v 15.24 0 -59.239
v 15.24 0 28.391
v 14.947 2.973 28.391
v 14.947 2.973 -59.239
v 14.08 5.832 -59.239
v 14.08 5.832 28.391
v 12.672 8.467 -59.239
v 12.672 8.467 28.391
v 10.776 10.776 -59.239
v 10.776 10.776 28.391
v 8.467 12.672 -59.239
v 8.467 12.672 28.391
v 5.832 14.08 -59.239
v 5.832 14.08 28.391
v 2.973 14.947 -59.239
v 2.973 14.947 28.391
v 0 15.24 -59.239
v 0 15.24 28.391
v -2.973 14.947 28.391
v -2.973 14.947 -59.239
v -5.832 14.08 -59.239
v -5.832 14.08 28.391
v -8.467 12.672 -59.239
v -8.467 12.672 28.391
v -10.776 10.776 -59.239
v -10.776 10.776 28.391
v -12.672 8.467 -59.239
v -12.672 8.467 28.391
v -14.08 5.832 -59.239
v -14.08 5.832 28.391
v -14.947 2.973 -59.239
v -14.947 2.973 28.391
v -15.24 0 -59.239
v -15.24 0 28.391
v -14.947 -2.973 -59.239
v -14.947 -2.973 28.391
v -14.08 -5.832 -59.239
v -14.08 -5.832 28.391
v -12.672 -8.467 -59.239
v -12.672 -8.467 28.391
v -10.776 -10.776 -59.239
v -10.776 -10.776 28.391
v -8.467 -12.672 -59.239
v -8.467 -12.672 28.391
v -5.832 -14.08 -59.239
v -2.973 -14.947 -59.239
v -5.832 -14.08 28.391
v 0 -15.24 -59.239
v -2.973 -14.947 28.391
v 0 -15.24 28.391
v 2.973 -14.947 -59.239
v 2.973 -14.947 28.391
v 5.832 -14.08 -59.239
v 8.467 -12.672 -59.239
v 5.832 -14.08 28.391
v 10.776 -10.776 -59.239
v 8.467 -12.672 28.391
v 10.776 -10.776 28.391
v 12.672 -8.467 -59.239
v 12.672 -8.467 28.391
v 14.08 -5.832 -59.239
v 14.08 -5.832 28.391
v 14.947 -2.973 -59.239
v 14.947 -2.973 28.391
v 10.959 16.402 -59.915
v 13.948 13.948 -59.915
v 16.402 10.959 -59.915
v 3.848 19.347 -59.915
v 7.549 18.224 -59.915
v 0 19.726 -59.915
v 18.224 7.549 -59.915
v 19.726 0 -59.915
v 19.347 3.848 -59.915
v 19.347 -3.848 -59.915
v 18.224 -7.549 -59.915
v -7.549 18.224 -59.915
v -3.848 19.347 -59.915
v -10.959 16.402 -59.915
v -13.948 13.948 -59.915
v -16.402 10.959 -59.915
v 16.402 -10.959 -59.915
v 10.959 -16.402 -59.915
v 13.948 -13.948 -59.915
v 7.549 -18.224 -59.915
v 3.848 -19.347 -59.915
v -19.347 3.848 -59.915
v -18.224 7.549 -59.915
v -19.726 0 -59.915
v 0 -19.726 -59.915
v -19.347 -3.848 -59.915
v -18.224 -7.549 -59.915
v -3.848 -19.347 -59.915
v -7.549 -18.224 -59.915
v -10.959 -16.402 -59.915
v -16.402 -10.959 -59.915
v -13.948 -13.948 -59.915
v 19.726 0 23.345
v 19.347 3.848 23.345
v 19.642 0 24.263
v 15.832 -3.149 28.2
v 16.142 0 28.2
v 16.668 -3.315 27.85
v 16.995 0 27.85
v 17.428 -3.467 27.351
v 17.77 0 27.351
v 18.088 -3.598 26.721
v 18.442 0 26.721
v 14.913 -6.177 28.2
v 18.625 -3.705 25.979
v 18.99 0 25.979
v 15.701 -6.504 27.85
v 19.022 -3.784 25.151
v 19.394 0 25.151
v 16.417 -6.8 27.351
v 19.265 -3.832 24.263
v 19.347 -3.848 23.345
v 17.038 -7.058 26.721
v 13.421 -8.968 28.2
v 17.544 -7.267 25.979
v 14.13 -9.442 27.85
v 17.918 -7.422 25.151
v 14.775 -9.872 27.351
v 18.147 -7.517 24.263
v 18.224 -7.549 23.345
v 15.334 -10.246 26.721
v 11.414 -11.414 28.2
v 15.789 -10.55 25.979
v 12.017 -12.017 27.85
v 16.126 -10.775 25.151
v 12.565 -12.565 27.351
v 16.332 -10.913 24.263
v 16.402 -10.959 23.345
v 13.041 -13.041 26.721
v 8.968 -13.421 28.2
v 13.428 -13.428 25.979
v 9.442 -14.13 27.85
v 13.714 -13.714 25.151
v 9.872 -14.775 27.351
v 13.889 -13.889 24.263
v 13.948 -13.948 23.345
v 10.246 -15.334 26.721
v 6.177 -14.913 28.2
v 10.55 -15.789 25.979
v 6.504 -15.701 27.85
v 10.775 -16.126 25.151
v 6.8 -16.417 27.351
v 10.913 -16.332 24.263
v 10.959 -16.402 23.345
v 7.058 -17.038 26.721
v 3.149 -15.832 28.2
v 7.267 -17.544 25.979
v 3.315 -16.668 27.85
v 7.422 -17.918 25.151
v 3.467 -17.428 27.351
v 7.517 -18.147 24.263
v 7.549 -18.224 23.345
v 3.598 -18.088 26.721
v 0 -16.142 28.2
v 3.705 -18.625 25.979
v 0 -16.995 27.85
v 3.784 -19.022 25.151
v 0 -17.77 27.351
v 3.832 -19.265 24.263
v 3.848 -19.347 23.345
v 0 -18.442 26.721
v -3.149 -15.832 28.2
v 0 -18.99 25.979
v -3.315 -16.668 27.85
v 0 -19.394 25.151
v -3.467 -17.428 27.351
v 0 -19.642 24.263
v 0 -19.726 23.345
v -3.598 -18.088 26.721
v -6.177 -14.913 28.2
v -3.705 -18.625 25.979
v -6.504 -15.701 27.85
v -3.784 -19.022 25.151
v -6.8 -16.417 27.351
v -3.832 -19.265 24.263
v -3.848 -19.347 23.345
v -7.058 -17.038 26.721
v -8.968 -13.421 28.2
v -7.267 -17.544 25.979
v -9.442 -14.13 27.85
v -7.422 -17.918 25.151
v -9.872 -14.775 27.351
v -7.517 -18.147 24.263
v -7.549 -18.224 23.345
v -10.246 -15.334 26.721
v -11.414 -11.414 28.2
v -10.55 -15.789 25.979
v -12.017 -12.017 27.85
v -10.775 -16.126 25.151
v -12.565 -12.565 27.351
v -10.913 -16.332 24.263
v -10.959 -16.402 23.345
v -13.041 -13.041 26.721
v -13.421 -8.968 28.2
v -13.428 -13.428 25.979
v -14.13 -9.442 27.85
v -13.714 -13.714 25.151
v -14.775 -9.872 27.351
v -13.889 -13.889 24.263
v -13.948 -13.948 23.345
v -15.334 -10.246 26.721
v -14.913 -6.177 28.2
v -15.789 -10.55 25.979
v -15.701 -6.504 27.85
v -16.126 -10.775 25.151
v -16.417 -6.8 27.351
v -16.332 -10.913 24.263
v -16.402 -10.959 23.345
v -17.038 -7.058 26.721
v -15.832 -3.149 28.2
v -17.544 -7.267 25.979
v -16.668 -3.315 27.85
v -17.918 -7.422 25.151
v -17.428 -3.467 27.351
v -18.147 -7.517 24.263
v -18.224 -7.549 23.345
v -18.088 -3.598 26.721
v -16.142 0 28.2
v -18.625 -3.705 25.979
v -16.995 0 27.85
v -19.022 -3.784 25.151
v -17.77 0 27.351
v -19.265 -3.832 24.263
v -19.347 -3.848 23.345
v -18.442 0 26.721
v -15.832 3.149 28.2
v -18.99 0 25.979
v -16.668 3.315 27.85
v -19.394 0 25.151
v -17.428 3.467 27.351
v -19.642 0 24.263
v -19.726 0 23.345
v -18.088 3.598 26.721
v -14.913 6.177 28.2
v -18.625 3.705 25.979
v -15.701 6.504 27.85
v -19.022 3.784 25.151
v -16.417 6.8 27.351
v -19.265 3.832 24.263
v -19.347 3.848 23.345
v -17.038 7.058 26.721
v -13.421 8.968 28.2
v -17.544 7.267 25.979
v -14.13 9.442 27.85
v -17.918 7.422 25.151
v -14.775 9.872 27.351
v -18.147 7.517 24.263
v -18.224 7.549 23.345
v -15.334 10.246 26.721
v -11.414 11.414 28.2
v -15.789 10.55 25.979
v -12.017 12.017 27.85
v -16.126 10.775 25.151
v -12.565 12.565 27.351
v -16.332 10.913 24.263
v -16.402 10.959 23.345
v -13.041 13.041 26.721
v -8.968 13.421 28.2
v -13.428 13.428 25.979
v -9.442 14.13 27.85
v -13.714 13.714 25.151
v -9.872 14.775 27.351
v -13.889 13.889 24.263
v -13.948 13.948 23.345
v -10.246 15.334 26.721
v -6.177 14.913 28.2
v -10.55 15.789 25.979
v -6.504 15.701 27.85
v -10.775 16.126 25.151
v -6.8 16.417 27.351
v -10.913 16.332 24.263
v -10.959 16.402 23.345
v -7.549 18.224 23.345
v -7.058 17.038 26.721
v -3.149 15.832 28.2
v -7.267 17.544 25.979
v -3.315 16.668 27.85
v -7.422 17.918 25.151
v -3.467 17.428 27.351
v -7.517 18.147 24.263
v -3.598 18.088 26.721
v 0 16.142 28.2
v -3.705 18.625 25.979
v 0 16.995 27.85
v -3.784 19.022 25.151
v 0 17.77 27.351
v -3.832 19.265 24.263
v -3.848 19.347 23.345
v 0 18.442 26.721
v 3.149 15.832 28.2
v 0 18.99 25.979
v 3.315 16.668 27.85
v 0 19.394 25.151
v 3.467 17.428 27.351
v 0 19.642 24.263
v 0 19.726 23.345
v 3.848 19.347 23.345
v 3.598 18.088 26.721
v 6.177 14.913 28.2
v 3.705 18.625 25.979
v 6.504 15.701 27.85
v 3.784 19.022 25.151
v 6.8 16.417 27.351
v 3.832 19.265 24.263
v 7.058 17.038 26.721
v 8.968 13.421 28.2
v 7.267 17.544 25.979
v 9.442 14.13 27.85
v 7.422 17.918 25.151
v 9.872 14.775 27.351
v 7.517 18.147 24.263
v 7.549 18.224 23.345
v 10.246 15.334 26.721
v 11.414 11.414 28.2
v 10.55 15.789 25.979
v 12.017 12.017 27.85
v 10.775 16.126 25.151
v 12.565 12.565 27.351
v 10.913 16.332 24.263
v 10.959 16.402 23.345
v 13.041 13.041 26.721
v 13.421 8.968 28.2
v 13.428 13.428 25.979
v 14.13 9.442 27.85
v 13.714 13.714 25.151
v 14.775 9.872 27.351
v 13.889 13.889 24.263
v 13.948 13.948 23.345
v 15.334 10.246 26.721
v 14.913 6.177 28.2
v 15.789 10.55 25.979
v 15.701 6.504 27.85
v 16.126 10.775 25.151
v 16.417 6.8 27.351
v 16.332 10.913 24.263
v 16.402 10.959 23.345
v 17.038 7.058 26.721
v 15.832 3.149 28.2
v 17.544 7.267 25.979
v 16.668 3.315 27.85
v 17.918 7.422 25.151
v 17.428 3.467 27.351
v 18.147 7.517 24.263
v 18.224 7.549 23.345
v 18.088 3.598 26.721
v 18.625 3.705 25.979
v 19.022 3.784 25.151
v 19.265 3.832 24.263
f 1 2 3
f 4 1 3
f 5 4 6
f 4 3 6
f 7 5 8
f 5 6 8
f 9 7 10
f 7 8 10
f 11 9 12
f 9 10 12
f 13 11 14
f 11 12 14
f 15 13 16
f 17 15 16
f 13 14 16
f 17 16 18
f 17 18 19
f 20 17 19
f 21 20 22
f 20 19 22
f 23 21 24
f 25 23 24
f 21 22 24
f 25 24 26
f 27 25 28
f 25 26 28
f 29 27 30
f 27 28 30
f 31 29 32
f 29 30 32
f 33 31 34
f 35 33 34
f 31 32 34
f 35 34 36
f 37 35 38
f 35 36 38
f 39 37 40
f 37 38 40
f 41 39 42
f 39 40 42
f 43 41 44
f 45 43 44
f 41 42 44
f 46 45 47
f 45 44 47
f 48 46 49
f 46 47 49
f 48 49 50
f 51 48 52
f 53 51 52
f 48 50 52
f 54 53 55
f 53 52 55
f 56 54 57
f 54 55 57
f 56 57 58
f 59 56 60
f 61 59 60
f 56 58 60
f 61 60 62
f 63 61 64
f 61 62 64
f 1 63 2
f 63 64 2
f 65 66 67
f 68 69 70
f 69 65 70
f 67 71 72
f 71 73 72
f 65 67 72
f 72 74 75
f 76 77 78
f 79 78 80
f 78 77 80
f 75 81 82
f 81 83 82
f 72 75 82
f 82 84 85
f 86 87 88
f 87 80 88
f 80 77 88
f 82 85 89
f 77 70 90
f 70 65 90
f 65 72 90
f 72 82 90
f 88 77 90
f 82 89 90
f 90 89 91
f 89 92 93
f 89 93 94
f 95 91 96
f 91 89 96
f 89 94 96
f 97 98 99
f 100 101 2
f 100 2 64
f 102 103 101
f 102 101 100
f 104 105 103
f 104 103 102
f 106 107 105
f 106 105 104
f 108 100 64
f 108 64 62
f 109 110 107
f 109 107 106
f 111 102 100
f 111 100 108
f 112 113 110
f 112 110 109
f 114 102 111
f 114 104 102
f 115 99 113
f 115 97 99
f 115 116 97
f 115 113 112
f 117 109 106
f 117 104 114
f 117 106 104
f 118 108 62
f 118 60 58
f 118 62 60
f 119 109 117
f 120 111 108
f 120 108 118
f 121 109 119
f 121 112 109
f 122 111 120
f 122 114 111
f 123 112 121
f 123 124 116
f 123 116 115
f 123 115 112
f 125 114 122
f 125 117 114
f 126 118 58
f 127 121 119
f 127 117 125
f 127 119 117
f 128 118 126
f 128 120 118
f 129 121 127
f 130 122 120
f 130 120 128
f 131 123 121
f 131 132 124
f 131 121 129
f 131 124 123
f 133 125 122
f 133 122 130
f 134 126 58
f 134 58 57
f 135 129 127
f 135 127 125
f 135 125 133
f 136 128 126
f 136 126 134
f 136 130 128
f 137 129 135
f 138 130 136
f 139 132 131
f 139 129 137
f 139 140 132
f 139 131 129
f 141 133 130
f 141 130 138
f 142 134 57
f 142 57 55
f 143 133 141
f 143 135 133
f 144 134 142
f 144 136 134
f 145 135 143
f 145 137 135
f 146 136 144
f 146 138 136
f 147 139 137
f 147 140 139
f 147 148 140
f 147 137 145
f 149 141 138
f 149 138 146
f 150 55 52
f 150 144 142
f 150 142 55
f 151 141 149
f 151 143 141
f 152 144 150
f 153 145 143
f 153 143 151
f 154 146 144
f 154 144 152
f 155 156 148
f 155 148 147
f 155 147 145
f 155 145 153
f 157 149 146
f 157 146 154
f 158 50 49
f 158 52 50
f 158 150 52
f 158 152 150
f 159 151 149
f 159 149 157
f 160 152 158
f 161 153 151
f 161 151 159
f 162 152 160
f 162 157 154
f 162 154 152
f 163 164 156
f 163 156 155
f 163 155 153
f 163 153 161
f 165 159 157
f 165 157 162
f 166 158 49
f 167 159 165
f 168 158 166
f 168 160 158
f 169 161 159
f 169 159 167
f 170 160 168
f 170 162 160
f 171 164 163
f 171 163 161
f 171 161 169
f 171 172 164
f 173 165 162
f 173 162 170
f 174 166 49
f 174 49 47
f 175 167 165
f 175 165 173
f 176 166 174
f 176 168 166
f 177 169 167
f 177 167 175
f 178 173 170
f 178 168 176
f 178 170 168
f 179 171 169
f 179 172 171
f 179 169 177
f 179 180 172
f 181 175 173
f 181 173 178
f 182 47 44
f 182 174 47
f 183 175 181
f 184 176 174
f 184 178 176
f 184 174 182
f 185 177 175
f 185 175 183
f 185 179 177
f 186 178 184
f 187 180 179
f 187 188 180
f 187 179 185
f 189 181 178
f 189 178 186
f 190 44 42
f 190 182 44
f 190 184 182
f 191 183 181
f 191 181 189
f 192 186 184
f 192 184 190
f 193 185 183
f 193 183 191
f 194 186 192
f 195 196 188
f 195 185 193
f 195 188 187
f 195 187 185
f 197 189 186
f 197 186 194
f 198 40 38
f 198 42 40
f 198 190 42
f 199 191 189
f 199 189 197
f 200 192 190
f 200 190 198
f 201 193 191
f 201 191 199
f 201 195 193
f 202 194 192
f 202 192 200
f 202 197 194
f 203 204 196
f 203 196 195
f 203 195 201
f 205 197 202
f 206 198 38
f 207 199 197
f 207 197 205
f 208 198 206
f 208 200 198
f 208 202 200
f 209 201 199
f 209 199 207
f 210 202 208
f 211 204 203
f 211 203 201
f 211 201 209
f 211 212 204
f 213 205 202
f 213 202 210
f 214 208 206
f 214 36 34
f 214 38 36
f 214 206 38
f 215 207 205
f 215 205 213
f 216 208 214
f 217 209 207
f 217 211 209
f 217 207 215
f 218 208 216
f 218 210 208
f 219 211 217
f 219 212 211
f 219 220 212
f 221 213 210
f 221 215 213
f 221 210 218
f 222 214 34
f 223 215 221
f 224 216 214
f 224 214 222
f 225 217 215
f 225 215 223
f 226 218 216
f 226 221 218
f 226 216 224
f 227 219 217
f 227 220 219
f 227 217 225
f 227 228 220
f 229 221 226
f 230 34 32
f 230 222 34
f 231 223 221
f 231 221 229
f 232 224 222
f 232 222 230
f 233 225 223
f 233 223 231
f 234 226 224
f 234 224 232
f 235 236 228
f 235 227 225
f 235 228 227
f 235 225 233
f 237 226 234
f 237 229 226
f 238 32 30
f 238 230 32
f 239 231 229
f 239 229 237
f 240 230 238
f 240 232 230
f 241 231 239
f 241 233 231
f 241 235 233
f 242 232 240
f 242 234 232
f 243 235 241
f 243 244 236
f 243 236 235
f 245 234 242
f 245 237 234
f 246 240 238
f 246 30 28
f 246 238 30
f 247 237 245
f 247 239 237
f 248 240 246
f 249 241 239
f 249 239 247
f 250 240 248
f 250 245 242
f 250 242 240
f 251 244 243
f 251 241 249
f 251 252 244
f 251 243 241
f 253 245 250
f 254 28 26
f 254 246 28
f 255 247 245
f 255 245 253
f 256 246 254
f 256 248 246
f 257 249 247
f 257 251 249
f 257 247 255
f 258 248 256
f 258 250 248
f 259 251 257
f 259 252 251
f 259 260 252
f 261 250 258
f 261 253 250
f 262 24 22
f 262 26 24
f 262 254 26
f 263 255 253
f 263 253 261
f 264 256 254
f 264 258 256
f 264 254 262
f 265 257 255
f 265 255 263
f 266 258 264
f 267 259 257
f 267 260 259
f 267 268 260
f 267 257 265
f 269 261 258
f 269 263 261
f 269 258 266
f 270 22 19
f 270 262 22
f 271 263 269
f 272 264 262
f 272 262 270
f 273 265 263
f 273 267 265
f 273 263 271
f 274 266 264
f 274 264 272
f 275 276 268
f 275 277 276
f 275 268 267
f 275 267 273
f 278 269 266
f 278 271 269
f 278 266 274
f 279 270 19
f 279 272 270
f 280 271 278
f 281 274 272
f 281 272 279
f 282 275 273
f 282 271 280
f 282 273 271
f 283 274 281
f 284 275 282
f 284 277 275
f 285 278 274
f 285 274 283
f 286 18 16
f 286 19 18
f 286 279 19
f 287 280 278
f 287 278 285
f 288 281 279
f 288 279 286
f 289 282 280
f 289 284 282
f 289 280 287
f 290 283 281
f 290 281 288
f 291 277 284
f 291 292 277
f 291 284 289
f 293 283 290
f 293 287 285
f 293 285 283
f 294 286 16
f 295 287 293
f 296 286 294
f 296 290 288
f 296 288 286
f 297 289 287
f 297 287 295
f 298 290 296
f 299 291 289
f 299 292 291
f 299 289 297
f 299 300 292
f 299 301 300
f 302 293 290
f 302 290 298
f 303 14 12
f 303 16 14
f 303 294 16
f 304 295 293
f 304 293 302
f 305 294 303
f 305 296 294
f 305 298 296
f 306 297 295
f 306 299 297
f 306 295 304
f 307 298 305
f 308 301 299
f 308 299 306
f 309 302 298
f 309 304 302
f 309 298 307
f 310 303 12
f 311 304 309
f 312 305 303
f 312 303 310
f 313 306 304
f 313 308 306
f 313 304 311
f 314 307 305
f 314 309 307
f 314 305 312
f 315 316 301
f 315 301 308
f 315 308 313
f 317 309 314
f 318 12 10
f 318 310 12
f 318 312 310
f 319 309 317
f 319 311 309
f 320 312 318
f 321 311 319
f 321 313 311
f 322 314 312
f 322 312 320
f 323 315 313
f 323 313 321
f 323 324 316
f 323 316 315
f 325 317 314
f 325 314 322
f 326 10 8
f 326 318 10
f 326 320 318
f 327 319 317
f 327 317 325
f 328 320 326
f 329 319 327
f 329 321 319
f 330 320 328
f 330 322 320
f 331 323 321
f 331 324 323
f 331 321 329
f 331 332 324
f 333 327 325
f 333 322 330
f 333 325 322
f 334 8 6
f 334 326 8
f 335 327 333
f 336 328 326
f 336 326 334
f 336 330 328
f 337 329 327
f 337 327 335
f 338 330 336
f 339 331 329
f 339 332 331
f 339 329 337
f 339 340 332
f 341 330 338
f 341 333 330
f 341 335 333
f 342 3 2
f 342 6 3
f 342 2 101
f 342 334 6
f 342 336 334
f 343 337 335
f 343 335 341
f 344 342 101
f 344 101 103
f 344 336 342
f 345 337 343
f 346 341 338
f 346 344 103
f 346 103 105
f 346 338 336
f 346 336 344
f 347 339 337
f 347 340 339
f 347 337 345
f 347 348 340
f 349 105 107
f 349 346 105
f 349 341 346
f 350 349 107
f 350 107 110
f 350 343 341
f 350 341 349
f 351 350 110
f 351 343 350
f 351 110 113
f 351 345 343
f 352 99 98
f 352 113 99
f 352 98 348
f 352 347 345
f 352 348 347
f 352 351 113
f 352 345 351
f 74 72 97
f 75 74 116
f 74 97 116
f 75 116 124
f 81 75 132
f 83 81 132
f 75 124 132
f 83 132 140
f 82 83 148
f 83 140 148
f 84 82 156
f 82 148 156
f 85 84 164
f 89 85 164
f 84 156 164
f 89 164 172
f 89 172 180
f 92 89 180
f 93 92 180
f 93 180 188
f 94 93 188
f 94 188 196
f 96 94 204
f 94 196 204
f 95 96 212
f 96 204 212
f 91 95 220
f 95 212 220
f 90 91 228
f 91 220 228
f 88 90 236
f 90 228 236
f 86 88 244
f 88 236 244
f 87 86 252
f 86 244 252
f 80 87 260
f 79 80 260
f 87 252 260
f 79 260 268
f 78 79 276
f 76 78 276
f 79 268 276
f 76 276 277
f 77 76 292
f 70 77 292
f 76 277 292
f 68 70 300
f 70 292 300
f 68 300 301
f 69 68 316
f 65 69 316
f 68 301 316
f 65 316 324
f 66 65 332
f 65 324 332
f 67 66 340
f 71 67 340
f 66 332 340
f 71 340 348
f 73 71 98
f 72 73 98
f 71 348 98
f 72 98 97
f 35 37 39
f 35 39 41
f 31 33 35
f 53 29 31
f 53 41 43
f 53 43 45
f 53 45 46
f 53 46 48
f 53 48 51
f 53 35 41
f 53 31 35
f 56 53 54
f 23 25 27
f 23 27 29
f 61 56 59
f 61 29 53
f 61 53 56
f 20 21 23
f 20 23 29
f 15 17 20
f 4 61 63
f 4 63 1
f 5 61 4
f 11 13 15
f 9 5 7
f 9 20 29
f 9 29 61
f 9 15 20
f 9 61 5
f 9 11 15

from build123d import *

# Parameters (mm, degrees)
F0_W     = 19.7259690613
F0_H     = 88.3059669286
F2_R     = 15.24
F3_DEPTH = 87.63


# Not quite as in the source:
# - a fillet or chamfer that OpenCascade refuses, or shapes differently, is made with other operations: its cross-section is extruded or revolved along the edge and cut away or added


with BuildPart() as f1:
    # F0 (on Front) → F1 (revolve)
    with BuildSketch(Plane.XZ):
        with Locations((9.8629845306, -15.7623393461)):
            Rectangle(F0_W, F0_H)
    revolve(axis=Axis((0, 0, 0), (0, 0, -1)))

    # F2 (on face) → F3 (cut)
    with BuildSketch(Plane.XY.offset(28.3906441182)):
        Circle(F2_R)
    extrude(amount=-F3_DEPTH, mode=Mode.SUBTRACT)

    # F4: fillet of radius 5.08 on 1 edges, made by hand

    # F4_s1 → F4_t2 (revolve, cut)
    with BuildSketch(Plane.XZ):
        with BuildLine():
            ThreePointArc((15.24, 28.3906441182), (18.4422881448, 26.7210487336), (19.7259690613, 23.345495236))
            Line((19.7259690613, 23.345495236), (19.7259690613, 28.3906441182))
            Line((19.7259690613, 28.3906441182), (15.24, 28.3906441182))
        make_face()
    revolve(axis=Axis((0, 0, 28.3906441182), (0, 0, -1)), mode=Mode.SUBTRACT)


solid = f1.part
